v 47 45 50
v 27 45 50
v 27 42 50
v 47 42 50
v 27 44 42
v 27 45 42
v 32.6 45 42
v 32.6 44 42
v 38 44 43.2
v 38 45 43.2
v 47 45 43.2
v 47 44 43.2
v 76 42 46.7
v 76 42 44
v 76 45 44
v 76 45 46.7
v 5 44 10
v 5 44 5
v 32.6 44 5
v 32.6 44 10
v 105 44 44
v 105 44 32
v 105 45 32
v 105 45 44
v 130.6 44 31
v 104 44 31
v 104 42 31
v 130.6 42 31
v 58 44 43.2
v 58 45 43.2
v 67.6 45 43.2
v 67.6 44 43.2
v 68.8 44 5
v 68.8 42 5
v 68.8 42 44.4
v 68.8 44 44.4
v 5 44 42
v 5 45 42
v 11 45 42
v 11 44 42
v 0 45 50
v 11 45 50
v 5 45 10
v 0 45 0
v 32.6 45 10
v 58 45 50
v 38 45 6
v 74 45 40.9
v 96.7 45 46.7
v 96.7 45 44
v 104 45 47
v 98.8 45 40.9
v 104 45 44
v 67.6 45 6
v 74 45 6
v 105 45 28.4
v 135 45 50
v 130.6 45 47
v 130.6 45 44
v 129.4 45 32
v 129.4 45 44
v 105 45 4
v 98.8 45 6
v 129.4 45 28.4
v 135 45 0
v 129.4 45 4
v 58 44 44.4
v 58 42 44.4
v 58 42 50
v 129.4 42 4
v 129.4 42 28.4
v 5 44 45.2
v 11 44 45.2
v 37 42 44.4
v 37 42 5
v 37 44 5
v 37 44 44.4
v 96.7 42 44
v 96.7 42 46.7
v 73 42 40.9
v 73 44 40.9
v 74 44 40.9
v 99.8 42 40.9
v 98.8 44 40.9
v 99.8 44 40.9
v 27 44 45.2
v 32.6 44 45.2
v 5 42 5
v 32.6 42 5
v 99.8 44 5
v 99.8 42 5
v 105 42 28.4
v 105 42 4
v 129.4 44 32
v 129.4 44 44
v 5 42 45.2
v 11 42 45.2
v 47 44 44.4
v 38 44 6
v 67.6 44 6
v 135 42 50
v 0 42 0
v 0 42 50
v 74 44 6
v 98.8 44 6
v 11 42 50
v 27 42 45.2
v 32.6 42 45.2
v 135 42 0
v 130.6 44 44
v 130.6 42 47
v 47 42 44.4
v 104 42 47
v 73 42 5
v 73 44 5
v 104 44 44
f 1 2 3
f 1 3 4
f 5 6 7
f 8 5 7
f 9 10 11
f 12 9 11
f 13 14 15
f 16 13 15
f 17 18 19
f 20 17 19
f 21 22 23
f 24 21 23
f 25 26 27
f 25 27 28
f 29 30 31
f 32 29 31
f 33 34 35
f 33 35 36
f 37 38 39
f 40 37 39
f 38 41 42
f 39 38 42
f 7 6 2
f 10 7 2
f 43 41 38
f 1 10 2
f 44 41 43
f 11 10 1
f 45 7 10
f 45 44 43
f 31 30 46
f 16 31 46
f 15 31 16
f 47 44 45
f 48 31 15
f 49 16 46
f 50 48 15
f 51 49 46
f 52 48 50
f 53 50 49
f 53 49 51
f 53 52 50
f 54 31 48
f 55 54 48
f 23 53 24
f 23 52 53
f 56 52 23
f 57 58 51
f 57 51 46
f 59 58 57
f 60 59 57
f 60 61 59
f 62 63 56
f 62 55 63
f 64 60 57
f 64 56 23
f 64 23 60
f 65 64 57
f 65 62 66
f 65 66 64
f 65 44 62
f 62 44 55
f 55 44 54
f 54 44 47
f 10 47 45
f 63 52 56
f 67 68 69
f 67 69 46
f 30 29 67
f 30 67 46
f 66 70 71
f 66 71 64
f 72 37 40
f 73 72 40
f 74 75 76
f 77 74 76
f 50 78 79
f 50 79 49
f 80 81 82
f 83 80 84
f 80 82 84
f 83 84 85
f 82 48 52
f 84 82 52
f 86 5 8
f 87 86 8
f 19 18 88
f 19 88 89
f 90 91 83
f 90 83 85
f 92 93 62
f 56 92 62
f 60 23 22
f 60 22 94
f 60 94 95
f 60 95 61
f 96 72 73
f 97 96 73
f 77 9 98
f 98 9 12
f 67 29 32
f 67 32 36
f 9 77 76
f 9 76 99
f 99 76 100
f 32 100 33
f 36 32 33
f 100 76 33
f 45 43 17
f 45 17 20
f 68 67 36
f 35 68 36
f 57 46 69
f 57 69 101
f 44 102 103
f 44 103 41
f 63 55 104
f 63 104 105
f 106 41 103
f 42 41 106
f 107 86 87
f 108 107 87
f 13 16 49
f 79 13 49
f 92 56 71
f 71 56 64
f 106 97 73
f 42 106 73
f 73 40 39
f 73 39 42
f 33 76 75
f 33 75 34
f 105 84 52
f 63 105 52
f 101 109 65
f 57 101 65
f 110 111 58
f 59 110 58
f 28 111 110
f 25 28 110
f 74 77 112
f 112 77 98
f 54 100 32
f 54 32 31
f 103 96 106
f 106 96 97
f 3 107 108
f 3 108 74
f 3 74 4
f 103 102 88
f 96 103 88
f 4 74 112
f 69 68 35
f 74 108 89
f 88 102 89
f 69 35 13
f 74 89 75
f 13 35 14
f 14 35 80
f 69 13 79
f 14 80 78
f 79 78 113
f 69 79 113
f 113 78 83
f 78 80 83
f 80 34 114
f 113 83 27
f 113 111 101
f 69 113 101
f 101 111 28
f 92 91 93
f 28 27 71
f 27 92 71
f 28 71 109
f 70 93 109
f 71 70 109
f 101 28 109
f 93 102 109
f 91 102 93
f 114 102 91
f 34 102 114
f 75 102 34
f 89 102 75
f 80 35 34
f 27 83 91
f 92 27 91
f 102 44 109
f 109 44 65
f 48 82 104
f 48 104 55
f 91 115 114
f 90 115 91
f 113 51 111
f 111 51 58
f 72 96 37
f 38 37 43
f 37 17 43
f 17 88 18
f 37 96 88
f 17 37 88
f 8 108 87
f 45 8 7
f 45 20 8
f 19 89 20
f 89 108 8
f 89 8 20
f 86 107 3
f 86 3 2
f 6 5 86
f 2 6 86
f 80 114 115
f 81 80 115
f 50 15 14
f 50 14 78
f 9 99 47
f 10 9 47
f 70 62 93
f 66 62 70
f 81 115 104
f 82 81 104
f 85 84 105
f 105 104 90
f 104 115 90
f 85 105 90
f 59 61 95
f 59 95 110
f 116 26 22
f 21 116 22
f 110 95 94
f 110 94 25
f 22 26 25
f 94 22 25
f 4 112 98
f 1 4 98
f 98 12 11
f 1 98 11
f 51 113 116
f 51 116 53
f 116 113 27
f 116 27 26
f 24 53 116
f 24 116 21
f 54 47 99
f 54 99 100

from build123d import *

# Parameters (mm, degrees)
BOX248_W     = 27.6
BOX248_H     = 2
BOX248_DEPTH = 40.2
BOX249_W     = 27.6
BOX249_H     = 1
BOX249_DEPTH = 32
BOX250_W     = 16
BOX250_H     = 3
BOX250_DEPTH = 8
BOX252_W     = 29.6
BOX252_H     = 1
BOX252_DEPTH = 37.2
BOX251_W     = 31.8
BOX251_H     = 2
BOX251_DEPTH = 39.4
BOX253_W     = 11
BOX253_H     = 3
BOX253_DEPTH = 8
BOX254_W     = 26.8
BOX254_H     = 2
BOX254_DEPTH = 35.9
BOX255_W     = 24.8
BOX255_H     = 1
BOX255_DEPTH = 34.9
BOX263_W     = 24.4
BOX263_H     = 3
BOX263_DEPTH = 24.4
BOX270_W     = 20.7
BOX270_H     = 8.9
BOX270_DEPTH = 2.7
BOX261_W     = 24.4
BOX261_H     = 1
BOX261_DEPTH = 13.8
BOX262_W     = 26.6
BOX262_H     = 1
BOX262_DEPTH = 3
BOX260_W     = 26.6
BOX260_H     = 2
BOX260_DEPTH = 16
BOX247_W     = 135
BOX247_H     = 3
BOX247_DEPTH = 50


with BuildPart() as cut_out_cam_large:
    # Box248 → Box248 (new body)
    with BuildSketch(Plane(origin=(5, 42, 5), x_dir=(1, 0, 0), z_dir=(0, 0, 1))):
        with Locations((13.8, 1)):
            Rectangle(BOX248_W, BOX248_H)
    extrude(amount=BOX248_DEPTH)


with BuildPart() as cut_out_cam_small:
    # Box249 → Box249 (new body)
    with BuildSketch(Plane(origin=(5, 44, 10), x_dir=(1, 0, 0), z_dir=(0, 0, 1))):
        with Locations((13.8, 0.5)):
            Rectangle(BOX249_W, BOX249_H)
    extrude(amount=BOX249_DEPTH)


with BuildPart() as cut_out_esp32cam:
    # Box250 → Box250 (new body)
    with BuildSketch(Plane(origin=(11, 42, 42), x_dir=(1, 0, 0), z_dir=(0, 0, 1))):
        with Locations((8, 1.5)):
            Rectangle(BOX250_W, BOX250_H)
    extrude(amount=BOX250_DEPTH)

    # Fusion: union cut-out cam large, cut-out cam small
    add(cut_out_cam_large.part)
    add(cut_out_cam_small.part)


with BuildPart() as cube225:
    # Box252 → Box252 (new body)
    with BuildSketch(Plane(origin=(38, 44, 6), x_dir=(1, 0, 0), z_dir=(0, 0, 1))):
        with Locations((14.8, 0.5)):
            Rectangle(BOX252_W, BOX252_H)
    extrude(amount=BOX252_DEPTH)


with BuildPart() as cube224:
    # Box251 → Box251 (new body)
    with BuildSketch(Plane(origin=(37, 42, 5), x_dir=(1, 0, 0), z_dir=(0, 0, 1))):
        with Locations((15.9, 1)):
            Rectangle(BOX251_W, BOX251_H)
    extrude(amount=BOX251_DEPTH)


with BuildPart() as cut_out_esp32:
    # Box253 → Box253 (new body)
    with BuildSketch(Plane(origin=(47, 42, 42), x_dir=(1, 0, 0), z_dir=(0, 0, 1))):
        with Locations((5.5, 1.5)):
            Rectangle(BOX253_W, BOX253_H)
    extrude(amount=BOX253_DEPTH)

    # Fusion066: union Cube225, Cube224
    add(cube225.part)
    add(cube224.part)


with BuildPart() as cube227:
    # Box254 → Box254 (new body)
    with BuildSketch(Plane(origin=(73, 42, 5), x_dir=(1, 0, 0), z_dir=(0, 0, 1))):
        with Locations((13.4, 1)):
            Rectangle(BOX254_W, BOX254_H)
    extrude(amount=BOX254_DEPTH)


with BuildPart() as cut_out_neo6mv2:
    # Box255 → Box255 (new body)
    with BuildSketch(Plane(origin=(74, 44, 6), x_dir=(1, 0, 0), z_dir=(0, 0, 1))):
        with Locations((12.4, 0.5)):
            Rectangle(BOX255_W, BOX255_H)
    extrude(amount=BOX255_DEPTH)

    # Fusion067: union Cube227
    add(cube227.part)


with BuildPart() as cut_out_gps_antenna:
    # Box263 → Box263 (new body)
    with BuildSketch(Plane(origin=(105, 42, 4), x_dir=(1, 0, 0), z_dir=(0, 0, 1))):
        with Locations((12.2, 1.5)):
            Rectangle(BOX263_W, BOX263_H)
    extrude(amount=BOX263_DEPTH)


with BuildPart() as cut_out_header:
    # Box270 → Box270 (new body)
    with BuildSketch(Plane(origin=(76, 36.5, 44), x_dir=(1, 0, 0), z_dir=(0, 0, 1))):
        with Locations((10.35, 4.45)):
            Rectangle(BOX270_W, BOX270_H)
    extrude(amount=BOX270_DEPTH)


with BuildPart() as cube234:
    # Box261 → Box261 (new body)
    with BuildSketch(Plane(origin=(103, 44, 30), x_dir=(1, 0, 0), z_dir=(0, 0, 1))):
        with Locations((12.2, 0.5)):
            Rectangle(BOX261_W, BOX261_H)
    extrude(amount=BOX261_DEPTH)


with BuildPart() as cube235:
    # Box262 → Box262 (new body)
    with BuildSketch(Plane(origin=(102, 44, 42), x_dir=(1, 0, 0), z_dir=(0, 0, 1))):
        with Locations((13.3, 0.5)):
            Rectangle(BOX262_W, BOX262_H)
    extrude(amount=BOX262_DEPTH)


with BuildPart() as cut_outs:
    # Box260 → Box260 (new body)
    with BuildSketch(Plane(origin=(102, 42, 29), x_dir=(1, 0, 0), z_dir=(0, 0, 1))):
        with Locations((13.3, 1)):
            Rectangle(BOX260_W, BOX260_H)
    extrude(amount=BOX260_DEPTH)

    # Fusion070: union Cube234, Cube235
    add(cube234.part)
    add(cube235.part)


with BuildPart() as cut_outs_1:
    # Fusion070 placement: moved
    add(cut_outs.part.moved(Location((2, 0, 2))))

    # Fusion071: union Cut-out ESP32CAM, Cut-out ESP32, Cut-out NEO6MV2, Cut-out GPS antenna, Cut-out header
    add(cut_out_esp32cam.part)
    add(cut_out_esp32.part)
    add(cut_out_neo6mv2.part)
    add(cut_out_gps_antenna.part)
    add(cut_out_header.part)


with BuildPart() as plate:
    # Box247 → Box247 (new body)
    with BuildSketch(Plane(origin=(0, 42, 0), x_dir=(1, 0, 0), z_dir=(0, 0, 1))):
        with Locations((67.5, 1.5)):
            Rectangle(BOX247_W, BOX247_H)
    extrude(amount=BOX247_DEPTH)

    # Cut197: cut  Cut-outs
    add(cut_outs_1.part, mode=Mode.SUBTRACT)


solid = plate.part
